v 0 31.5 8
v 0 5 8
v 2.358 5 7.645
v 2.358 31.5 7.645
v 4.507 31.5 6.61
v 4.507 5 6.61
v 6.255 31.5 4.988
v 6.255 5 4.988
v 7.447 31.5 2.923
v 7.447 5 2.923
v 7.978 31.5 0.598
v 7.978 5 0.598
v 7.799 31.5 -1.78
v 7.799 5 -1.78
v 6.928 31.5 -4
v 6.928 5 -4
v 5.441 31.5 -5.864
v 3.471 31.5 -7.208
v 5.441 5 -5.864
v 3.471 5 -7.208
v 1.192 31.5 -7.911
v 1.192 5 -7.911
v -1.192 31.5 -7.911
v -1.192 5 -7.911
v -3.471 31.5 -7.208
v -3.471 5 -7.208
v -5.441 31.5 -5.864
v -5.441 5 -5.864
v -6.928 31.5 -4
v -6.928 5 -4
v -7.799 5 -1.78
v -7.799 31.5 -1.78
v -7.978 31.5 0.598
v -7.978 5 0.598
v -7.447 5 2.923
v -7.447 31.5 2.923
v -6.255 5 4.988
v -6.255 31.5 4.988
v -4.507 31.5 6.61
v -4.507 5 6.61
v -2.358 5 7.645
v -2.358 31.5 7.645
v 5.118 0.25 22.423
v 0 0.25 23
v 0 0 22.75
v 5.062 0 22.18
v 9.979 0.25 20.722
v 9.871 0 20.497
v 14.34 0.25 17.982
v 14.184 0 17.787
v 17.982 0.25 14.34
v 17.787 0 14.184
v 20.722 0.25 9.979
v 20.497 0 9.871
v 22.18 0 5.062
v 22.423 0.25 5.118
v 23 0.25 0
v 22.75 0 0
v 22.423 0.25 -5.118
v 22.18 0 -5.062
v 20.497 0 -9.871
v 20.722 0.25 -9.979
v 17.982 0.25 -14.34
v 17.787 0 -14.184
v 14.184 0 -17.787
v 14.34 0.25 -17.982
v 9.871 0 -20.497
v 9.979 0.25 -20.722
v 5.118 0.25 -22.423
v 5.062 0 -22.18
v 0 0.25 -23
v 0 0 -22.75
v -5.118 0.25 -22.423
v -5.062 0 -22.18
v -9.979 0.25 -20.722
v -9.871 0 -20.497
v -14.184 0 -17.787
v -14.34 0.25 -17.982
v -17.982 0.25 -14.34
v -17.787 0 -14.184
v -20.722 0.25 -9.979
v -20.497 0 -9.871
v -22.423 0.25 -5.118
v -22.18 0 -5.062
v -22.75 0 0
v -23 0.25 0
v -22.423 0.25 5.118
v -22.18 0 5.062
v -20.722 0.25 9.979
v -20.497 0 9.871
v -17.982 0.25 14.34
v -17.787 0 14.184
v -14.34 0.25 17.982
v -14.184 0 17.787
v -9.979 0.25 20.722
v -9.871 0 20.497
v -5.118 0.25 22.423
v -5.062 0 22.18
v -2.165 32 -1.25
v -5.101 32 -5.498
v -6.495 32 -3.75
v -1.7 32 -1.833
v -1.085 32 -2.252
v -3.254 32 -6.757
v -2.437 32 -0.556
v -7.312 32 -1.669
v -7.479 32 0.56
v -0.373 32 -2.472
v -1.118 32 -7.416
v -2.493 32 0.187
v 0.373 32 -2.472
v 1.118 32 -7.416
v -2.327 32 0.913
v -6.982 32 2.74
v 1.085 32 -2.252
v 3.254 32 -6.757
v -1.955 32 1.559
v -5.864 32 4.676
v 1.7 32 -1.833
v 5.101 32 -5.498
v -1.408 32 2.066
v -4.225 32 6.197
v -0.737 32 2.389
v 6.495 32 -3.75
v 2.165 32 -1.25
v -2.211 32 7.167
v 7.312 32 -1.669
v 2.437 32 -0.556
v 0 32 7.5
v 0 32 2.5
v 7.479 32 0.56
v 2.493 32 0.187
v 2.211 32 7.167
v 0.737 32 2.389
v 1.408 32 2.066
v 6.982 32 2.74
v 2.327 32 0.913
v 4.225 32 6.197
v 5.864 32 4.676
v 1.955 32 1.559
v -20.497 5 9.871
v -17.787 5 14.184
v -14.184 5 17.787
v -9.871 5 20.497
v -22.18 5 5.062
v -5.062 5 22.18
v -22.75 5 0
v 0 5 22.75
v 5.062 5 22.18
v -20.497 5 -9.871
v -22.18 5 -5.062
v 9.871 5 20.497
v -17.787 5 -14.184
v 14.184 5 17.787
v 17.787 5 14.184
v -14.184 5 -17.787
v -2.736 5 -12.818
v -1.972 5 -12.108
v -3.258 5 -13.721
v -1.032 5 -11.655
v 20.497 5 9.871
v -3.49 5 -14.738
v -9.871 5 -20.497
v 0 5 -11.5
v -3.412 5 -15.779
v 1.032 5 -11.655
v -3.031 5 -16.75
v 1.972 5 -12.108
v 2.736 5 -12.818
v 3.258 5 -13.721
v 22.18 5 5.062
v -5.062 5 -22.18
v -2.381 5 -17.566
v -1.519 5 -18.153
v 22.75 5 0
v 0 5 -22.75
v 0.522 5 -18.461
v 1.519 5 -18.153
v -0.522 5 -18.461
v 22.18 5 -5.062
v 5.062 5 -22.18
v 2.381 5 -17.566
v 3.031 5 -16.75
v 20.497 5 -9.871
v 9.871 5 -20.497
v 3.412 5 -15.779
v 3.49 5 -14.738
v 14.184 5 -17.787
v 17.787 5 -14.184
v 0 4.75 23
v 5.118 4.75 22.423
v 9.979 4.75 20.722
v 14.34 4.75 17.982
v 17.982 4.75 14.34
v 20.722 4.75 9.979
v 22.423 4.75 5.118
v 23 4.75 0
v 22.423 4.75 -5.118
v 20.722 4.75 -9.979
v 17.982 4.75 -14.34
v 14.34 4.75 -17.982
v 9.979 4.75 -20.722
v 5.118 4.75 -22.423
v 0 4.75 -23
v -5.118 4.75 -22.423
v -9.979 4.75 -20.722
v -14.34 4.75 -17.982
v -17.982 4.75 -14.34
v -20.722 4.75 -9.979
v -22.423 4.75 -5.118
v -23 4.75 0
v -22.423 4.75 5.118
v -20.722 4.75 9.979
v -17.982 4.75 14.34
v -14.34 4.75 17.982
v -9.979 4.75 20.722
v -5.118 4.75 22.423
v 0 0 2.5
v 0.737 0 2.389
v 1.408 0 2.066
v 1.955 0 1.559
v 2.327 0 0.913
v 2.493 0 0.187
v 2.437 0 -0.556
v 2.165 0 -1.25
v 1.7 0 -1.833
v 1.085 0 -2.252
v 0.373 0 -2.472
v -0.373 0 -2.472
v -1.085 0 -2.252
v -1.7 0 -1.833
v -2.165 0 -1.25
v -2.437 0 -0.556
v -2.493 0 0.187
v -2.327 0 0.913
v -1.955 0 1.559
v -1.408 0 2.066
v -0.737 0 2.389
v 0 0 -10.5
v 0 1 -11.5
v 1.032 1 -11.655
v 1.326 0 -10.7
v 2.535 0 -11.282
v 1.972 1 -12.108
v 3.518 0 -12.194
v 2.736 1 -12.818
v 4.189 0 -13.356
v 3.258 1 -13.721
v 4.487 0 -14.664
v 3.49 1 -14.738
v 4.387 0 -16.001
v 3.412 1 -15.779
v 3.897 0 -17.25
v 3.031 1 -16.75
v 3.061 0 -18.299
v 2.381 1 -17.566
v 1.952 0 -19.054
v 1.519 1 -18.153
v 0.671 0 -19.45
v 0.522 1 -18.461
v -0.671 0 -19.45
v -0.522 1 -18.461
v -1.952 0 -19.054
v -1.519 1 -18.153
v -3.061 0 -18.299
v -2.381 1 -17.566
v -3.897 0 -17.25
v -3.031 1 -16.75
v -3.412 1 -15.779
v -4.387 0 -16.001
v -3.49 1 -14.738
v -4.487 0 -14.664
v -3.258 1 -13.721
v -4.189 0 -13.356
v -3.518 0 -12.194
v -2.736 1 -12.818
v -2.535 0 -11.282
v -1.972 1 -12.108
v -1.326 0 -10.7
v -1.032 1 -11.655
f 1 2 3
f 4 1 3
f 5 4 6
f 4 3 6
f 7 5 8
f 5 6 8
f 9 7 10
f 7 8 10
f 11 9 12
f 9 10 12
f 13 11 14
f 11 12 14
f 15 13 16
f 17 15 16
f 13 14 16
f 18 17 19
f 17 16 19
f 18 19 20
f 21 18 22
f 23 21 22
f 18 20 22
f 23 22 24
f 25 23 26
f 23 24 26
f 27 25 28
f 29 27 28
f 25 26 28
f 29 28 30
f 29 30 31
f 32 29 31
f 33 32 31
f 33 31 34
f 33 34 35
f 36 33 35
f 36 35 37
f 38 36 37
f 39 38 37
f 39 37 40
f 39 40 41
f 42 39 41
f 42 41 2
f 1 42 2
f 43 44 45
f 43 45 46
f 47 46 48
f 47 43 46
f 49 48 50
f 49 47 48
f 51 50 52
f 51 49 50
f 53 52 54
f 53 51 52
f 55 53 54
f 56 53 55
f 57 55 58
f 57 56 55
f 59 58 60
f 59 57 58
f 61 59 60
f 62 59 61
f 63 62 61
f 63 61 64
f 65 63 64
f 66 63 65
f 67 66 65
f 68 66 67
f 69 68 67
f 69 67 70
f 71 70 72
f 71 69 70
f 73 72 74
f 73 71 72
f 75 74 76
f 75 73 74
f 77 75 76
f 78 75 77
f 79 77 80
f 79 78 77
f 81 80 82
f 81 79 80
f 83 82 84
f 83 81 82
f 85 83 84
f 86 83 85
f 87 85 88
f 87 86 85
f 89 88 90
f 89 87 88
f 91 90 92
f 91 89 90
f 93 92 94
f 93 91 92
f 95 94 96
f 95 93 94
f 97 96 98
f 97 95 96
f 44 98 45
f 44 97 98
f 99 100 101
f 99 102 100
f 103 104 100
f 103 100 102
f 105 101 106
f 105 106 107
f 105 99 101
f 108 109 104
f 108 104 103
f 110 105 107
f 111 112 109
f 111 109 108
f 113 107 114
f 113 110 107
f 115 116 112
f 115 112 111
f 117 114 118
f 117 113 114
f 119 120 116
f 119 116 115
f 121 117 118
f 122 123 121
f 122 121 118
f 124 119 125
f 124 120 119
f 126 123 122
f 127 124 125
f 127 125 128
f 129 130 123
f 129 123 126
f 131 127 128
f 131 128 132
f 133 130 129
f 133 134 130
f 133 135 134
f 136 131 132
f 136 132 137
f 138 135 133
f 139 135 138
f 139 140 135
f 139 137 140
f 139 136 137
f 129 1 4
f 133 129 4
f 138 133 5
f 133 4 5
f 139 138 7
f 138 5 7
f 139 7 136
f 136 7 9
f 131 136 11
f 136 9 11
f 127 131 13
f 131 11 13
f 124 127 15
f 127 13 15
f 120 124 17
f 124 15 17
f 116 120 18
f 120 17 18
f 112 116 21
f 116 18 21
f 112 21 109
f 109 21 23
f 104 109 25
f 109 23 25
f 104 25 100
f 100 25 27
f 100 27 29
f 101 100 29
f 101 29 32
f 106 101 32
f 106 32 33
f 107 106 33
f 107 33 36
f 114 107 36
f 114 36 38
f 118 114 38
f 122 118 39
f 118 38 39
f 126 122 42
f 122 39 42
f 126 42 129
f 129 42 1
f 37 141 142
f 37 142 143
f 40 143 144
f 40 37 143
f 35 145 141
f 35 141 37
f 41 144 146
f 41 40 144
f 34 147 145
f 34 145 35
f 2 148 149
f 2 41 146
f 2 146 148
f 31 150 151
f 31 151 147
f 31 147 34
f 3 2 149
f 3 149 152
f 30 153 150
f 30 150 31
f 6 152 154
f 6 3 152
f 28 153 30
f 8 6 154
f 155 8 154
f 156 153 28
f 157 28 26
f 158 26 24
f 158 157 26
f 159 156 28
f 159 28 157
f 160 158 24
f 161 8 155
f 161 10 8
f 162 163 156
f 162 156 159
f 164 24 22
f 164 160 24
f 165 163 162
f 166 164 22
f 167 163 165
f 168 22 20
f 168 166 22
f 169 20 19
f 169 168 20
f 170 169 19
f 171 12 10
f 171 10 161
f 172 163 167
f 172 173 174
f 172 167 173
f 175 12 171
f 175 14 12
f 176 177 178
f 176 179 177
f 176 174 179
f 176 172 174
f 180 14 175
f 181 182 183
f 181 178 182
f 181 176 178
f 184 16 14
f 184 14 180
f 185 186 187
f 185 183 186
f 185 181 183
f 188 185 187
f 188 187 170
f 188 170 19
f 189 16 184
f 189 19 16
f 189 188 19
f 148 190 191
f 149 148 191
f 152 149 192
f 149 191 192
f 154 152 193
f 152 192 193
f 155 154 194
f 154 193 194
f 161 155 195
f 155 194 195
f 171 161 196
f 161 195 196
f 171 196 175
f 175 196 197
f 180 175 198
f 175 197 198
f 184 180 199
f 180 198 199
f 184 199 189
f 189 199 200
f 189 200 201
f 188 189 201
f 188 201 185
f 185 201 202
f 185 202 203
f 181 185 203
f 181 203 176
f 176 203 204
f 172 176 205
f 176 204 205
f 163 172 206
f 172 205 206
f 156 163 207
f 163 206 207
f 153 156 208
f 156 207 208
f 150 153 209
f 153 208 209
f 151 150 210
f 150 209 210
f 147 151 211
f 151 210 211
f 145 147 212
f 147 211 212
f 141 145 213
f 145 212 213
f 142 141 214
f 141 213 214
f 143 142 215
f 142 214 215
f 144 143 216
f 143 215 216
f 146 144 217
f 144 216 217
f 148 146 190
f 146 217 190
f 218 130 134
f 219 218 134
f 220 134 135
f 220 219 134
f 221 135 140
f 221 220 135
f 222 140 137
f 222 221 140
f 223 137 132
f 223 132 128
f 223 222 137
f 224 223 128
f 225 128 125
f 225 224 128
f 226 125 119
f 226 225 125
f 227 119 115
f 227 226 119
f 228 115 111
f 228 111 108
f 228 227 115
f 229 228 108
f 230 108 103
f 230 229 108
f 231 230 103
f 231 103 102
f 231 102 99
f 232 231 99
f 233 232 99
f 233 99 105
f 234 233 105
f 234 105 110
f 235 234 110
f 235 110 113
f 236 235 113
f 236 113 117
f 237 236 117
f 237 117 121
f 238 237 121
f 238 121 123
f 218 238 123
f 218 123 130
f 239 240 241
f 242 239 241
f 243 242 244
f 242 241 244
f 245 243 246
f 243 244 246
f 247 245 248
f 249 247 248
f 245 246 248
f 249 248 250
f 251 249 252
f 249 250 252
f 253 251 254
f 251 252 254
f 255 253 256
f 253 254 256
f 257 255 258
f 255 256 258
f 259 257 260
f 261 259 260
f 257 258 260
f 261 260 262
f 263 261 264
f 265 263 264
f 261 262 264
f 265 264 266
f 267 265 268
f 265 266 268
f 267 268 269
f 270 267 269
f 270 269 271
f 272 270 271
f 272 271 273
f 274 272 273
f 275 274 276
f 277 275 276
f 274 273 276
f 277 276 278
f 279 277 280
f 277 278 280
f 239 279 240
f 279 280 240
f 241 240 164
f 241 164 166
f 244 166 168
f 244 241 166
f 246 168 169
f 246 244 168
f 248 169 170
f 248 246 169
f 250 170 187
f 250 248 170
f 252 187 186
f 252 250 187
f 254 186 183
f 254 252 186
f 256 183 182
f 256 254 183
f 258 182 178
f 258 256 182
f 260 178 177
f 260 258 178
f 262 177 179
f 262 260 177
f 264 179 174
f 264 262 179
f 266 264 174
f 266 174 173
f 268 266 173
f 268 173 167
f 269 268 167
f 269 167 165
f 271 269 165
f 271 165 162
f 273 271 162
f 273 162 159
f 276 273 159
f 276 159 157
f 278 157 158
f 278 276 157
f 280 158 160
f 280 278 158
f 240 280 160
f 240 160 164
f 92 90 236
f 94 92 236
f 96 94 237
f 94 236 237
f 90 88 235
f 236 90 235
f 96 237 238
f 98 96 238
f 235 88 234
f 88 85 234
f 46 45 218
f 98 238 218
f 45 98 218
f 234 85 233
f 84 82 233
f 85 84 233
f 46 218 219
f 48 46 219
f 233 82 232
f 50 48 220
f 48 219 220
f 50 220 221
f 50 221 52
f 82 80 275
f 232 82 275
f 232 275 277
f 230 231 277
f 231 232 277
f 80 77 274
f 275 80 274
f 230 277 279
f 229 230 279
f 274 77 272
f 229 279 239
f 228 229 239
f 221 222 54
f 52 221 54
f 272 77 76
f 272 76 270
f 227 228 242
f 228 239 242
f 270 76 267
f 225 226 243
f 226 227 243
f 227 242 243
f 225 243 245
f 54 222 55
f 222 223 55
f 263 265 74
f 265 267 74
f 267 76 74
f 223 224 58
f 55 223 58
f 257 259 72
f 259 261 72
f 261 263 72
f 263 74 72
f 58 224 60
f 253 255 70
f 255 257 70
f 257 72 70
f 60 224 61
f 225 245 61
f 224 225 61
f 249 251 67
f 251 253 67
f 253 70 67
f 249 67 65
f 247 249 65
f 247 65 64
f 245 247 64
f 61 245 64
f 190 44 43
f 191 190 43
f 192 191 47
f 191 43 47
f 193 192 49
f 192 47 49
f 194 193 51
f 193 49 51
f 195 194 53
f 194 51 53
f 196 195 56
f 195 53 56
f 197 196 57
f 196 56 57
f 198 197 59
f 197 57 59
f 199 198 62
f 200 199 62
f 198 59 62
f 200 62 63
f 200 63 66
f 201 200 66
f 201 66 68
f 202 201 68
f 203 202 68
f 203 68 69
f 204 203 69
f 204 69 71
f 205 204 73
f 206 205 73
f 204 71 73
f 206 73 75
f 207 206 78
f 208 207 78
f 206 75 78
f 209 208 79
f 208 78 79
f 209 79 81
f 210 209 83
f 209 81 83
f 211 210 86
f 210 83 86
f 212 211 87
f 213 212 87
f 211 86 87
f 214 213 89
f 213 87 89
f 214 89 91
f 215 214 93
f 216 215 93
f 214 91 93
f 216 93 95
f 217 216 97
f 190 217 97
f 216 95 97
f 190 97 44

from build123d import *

# Parameters (mm, degrees)
SKETCH1_R           = 23
SKETCH1_R_2         = 3.5
SKETCH1_R_3         = 2.5
BOSS_EXTRUDE1_DEPTH = 5
SKETCH1_3_R         = 8
SKETCH1_3_R_2       = 2.5
BOSS_EXTRUDE2_DEPTH = 32
CHAMFER1_SIZE       = 0.5
CHAMFER2_SIZE       = 0.25
CHAMFER3_SIZE       = 1


with BuildPart() as part:
    # Sketch1 → Boss-Extrude1 (new body)
    with BuildSketch(Plane(origin=(0, 0, 0), x_dir=(1, 0, 0), z_dir=(0, 1, 0))):
        Circle(SKETCH1_R)
        with Locations((0, 15)):
            Circle(SKETCH1_R_2, mode=Mode.SUBTRACT)
        Circle(SKETCH1_R_3, mode=Mode.SUBTRACT)
    extrude(amount=BOSS_EXTRUDE1_DEPTH)

    # Sketch1<3> → Boss-Extrude2 (add)
    with BuildSketch(Plane(origin=(0, 0, 0), x_dir=(1, 0, 0), z_dir=(0, 1, 0))):
        Circle(SKETCH1_3_R)
        Circle(SKETCH1_3_R_2, mode=Mode.SUBTRACT)
    extrude(amount=BOSS_EXTRUDE2_DEPTH)

    # Chamfer1
    chamfer1_edges = [part.edges().sort_by_distance(p)[0] for p in [
        (-8, 32, 0),
    ]]
    chamfer(chamfer1_edges, length=CHAMFER1_SIZE)

    # Chamfer2
    chamfer2_edges = [part.edges().sort_by_distance(p)[0] for p in [
        (-23, 0, 0),
        (-23, 5, 0),
    ]]
    chamfer(chamfer2_edges, length=CHAMFER2_SIZE)

    # Chamfer3
    chamfer3_edges = [part.edges().sort_by_distance(p)[0] for p in [
        (-3.5, 0, -15),
    ]]
    chamfer(chamfer3_edges, length=CHAMFER3_SIZE)


solid = part.part
